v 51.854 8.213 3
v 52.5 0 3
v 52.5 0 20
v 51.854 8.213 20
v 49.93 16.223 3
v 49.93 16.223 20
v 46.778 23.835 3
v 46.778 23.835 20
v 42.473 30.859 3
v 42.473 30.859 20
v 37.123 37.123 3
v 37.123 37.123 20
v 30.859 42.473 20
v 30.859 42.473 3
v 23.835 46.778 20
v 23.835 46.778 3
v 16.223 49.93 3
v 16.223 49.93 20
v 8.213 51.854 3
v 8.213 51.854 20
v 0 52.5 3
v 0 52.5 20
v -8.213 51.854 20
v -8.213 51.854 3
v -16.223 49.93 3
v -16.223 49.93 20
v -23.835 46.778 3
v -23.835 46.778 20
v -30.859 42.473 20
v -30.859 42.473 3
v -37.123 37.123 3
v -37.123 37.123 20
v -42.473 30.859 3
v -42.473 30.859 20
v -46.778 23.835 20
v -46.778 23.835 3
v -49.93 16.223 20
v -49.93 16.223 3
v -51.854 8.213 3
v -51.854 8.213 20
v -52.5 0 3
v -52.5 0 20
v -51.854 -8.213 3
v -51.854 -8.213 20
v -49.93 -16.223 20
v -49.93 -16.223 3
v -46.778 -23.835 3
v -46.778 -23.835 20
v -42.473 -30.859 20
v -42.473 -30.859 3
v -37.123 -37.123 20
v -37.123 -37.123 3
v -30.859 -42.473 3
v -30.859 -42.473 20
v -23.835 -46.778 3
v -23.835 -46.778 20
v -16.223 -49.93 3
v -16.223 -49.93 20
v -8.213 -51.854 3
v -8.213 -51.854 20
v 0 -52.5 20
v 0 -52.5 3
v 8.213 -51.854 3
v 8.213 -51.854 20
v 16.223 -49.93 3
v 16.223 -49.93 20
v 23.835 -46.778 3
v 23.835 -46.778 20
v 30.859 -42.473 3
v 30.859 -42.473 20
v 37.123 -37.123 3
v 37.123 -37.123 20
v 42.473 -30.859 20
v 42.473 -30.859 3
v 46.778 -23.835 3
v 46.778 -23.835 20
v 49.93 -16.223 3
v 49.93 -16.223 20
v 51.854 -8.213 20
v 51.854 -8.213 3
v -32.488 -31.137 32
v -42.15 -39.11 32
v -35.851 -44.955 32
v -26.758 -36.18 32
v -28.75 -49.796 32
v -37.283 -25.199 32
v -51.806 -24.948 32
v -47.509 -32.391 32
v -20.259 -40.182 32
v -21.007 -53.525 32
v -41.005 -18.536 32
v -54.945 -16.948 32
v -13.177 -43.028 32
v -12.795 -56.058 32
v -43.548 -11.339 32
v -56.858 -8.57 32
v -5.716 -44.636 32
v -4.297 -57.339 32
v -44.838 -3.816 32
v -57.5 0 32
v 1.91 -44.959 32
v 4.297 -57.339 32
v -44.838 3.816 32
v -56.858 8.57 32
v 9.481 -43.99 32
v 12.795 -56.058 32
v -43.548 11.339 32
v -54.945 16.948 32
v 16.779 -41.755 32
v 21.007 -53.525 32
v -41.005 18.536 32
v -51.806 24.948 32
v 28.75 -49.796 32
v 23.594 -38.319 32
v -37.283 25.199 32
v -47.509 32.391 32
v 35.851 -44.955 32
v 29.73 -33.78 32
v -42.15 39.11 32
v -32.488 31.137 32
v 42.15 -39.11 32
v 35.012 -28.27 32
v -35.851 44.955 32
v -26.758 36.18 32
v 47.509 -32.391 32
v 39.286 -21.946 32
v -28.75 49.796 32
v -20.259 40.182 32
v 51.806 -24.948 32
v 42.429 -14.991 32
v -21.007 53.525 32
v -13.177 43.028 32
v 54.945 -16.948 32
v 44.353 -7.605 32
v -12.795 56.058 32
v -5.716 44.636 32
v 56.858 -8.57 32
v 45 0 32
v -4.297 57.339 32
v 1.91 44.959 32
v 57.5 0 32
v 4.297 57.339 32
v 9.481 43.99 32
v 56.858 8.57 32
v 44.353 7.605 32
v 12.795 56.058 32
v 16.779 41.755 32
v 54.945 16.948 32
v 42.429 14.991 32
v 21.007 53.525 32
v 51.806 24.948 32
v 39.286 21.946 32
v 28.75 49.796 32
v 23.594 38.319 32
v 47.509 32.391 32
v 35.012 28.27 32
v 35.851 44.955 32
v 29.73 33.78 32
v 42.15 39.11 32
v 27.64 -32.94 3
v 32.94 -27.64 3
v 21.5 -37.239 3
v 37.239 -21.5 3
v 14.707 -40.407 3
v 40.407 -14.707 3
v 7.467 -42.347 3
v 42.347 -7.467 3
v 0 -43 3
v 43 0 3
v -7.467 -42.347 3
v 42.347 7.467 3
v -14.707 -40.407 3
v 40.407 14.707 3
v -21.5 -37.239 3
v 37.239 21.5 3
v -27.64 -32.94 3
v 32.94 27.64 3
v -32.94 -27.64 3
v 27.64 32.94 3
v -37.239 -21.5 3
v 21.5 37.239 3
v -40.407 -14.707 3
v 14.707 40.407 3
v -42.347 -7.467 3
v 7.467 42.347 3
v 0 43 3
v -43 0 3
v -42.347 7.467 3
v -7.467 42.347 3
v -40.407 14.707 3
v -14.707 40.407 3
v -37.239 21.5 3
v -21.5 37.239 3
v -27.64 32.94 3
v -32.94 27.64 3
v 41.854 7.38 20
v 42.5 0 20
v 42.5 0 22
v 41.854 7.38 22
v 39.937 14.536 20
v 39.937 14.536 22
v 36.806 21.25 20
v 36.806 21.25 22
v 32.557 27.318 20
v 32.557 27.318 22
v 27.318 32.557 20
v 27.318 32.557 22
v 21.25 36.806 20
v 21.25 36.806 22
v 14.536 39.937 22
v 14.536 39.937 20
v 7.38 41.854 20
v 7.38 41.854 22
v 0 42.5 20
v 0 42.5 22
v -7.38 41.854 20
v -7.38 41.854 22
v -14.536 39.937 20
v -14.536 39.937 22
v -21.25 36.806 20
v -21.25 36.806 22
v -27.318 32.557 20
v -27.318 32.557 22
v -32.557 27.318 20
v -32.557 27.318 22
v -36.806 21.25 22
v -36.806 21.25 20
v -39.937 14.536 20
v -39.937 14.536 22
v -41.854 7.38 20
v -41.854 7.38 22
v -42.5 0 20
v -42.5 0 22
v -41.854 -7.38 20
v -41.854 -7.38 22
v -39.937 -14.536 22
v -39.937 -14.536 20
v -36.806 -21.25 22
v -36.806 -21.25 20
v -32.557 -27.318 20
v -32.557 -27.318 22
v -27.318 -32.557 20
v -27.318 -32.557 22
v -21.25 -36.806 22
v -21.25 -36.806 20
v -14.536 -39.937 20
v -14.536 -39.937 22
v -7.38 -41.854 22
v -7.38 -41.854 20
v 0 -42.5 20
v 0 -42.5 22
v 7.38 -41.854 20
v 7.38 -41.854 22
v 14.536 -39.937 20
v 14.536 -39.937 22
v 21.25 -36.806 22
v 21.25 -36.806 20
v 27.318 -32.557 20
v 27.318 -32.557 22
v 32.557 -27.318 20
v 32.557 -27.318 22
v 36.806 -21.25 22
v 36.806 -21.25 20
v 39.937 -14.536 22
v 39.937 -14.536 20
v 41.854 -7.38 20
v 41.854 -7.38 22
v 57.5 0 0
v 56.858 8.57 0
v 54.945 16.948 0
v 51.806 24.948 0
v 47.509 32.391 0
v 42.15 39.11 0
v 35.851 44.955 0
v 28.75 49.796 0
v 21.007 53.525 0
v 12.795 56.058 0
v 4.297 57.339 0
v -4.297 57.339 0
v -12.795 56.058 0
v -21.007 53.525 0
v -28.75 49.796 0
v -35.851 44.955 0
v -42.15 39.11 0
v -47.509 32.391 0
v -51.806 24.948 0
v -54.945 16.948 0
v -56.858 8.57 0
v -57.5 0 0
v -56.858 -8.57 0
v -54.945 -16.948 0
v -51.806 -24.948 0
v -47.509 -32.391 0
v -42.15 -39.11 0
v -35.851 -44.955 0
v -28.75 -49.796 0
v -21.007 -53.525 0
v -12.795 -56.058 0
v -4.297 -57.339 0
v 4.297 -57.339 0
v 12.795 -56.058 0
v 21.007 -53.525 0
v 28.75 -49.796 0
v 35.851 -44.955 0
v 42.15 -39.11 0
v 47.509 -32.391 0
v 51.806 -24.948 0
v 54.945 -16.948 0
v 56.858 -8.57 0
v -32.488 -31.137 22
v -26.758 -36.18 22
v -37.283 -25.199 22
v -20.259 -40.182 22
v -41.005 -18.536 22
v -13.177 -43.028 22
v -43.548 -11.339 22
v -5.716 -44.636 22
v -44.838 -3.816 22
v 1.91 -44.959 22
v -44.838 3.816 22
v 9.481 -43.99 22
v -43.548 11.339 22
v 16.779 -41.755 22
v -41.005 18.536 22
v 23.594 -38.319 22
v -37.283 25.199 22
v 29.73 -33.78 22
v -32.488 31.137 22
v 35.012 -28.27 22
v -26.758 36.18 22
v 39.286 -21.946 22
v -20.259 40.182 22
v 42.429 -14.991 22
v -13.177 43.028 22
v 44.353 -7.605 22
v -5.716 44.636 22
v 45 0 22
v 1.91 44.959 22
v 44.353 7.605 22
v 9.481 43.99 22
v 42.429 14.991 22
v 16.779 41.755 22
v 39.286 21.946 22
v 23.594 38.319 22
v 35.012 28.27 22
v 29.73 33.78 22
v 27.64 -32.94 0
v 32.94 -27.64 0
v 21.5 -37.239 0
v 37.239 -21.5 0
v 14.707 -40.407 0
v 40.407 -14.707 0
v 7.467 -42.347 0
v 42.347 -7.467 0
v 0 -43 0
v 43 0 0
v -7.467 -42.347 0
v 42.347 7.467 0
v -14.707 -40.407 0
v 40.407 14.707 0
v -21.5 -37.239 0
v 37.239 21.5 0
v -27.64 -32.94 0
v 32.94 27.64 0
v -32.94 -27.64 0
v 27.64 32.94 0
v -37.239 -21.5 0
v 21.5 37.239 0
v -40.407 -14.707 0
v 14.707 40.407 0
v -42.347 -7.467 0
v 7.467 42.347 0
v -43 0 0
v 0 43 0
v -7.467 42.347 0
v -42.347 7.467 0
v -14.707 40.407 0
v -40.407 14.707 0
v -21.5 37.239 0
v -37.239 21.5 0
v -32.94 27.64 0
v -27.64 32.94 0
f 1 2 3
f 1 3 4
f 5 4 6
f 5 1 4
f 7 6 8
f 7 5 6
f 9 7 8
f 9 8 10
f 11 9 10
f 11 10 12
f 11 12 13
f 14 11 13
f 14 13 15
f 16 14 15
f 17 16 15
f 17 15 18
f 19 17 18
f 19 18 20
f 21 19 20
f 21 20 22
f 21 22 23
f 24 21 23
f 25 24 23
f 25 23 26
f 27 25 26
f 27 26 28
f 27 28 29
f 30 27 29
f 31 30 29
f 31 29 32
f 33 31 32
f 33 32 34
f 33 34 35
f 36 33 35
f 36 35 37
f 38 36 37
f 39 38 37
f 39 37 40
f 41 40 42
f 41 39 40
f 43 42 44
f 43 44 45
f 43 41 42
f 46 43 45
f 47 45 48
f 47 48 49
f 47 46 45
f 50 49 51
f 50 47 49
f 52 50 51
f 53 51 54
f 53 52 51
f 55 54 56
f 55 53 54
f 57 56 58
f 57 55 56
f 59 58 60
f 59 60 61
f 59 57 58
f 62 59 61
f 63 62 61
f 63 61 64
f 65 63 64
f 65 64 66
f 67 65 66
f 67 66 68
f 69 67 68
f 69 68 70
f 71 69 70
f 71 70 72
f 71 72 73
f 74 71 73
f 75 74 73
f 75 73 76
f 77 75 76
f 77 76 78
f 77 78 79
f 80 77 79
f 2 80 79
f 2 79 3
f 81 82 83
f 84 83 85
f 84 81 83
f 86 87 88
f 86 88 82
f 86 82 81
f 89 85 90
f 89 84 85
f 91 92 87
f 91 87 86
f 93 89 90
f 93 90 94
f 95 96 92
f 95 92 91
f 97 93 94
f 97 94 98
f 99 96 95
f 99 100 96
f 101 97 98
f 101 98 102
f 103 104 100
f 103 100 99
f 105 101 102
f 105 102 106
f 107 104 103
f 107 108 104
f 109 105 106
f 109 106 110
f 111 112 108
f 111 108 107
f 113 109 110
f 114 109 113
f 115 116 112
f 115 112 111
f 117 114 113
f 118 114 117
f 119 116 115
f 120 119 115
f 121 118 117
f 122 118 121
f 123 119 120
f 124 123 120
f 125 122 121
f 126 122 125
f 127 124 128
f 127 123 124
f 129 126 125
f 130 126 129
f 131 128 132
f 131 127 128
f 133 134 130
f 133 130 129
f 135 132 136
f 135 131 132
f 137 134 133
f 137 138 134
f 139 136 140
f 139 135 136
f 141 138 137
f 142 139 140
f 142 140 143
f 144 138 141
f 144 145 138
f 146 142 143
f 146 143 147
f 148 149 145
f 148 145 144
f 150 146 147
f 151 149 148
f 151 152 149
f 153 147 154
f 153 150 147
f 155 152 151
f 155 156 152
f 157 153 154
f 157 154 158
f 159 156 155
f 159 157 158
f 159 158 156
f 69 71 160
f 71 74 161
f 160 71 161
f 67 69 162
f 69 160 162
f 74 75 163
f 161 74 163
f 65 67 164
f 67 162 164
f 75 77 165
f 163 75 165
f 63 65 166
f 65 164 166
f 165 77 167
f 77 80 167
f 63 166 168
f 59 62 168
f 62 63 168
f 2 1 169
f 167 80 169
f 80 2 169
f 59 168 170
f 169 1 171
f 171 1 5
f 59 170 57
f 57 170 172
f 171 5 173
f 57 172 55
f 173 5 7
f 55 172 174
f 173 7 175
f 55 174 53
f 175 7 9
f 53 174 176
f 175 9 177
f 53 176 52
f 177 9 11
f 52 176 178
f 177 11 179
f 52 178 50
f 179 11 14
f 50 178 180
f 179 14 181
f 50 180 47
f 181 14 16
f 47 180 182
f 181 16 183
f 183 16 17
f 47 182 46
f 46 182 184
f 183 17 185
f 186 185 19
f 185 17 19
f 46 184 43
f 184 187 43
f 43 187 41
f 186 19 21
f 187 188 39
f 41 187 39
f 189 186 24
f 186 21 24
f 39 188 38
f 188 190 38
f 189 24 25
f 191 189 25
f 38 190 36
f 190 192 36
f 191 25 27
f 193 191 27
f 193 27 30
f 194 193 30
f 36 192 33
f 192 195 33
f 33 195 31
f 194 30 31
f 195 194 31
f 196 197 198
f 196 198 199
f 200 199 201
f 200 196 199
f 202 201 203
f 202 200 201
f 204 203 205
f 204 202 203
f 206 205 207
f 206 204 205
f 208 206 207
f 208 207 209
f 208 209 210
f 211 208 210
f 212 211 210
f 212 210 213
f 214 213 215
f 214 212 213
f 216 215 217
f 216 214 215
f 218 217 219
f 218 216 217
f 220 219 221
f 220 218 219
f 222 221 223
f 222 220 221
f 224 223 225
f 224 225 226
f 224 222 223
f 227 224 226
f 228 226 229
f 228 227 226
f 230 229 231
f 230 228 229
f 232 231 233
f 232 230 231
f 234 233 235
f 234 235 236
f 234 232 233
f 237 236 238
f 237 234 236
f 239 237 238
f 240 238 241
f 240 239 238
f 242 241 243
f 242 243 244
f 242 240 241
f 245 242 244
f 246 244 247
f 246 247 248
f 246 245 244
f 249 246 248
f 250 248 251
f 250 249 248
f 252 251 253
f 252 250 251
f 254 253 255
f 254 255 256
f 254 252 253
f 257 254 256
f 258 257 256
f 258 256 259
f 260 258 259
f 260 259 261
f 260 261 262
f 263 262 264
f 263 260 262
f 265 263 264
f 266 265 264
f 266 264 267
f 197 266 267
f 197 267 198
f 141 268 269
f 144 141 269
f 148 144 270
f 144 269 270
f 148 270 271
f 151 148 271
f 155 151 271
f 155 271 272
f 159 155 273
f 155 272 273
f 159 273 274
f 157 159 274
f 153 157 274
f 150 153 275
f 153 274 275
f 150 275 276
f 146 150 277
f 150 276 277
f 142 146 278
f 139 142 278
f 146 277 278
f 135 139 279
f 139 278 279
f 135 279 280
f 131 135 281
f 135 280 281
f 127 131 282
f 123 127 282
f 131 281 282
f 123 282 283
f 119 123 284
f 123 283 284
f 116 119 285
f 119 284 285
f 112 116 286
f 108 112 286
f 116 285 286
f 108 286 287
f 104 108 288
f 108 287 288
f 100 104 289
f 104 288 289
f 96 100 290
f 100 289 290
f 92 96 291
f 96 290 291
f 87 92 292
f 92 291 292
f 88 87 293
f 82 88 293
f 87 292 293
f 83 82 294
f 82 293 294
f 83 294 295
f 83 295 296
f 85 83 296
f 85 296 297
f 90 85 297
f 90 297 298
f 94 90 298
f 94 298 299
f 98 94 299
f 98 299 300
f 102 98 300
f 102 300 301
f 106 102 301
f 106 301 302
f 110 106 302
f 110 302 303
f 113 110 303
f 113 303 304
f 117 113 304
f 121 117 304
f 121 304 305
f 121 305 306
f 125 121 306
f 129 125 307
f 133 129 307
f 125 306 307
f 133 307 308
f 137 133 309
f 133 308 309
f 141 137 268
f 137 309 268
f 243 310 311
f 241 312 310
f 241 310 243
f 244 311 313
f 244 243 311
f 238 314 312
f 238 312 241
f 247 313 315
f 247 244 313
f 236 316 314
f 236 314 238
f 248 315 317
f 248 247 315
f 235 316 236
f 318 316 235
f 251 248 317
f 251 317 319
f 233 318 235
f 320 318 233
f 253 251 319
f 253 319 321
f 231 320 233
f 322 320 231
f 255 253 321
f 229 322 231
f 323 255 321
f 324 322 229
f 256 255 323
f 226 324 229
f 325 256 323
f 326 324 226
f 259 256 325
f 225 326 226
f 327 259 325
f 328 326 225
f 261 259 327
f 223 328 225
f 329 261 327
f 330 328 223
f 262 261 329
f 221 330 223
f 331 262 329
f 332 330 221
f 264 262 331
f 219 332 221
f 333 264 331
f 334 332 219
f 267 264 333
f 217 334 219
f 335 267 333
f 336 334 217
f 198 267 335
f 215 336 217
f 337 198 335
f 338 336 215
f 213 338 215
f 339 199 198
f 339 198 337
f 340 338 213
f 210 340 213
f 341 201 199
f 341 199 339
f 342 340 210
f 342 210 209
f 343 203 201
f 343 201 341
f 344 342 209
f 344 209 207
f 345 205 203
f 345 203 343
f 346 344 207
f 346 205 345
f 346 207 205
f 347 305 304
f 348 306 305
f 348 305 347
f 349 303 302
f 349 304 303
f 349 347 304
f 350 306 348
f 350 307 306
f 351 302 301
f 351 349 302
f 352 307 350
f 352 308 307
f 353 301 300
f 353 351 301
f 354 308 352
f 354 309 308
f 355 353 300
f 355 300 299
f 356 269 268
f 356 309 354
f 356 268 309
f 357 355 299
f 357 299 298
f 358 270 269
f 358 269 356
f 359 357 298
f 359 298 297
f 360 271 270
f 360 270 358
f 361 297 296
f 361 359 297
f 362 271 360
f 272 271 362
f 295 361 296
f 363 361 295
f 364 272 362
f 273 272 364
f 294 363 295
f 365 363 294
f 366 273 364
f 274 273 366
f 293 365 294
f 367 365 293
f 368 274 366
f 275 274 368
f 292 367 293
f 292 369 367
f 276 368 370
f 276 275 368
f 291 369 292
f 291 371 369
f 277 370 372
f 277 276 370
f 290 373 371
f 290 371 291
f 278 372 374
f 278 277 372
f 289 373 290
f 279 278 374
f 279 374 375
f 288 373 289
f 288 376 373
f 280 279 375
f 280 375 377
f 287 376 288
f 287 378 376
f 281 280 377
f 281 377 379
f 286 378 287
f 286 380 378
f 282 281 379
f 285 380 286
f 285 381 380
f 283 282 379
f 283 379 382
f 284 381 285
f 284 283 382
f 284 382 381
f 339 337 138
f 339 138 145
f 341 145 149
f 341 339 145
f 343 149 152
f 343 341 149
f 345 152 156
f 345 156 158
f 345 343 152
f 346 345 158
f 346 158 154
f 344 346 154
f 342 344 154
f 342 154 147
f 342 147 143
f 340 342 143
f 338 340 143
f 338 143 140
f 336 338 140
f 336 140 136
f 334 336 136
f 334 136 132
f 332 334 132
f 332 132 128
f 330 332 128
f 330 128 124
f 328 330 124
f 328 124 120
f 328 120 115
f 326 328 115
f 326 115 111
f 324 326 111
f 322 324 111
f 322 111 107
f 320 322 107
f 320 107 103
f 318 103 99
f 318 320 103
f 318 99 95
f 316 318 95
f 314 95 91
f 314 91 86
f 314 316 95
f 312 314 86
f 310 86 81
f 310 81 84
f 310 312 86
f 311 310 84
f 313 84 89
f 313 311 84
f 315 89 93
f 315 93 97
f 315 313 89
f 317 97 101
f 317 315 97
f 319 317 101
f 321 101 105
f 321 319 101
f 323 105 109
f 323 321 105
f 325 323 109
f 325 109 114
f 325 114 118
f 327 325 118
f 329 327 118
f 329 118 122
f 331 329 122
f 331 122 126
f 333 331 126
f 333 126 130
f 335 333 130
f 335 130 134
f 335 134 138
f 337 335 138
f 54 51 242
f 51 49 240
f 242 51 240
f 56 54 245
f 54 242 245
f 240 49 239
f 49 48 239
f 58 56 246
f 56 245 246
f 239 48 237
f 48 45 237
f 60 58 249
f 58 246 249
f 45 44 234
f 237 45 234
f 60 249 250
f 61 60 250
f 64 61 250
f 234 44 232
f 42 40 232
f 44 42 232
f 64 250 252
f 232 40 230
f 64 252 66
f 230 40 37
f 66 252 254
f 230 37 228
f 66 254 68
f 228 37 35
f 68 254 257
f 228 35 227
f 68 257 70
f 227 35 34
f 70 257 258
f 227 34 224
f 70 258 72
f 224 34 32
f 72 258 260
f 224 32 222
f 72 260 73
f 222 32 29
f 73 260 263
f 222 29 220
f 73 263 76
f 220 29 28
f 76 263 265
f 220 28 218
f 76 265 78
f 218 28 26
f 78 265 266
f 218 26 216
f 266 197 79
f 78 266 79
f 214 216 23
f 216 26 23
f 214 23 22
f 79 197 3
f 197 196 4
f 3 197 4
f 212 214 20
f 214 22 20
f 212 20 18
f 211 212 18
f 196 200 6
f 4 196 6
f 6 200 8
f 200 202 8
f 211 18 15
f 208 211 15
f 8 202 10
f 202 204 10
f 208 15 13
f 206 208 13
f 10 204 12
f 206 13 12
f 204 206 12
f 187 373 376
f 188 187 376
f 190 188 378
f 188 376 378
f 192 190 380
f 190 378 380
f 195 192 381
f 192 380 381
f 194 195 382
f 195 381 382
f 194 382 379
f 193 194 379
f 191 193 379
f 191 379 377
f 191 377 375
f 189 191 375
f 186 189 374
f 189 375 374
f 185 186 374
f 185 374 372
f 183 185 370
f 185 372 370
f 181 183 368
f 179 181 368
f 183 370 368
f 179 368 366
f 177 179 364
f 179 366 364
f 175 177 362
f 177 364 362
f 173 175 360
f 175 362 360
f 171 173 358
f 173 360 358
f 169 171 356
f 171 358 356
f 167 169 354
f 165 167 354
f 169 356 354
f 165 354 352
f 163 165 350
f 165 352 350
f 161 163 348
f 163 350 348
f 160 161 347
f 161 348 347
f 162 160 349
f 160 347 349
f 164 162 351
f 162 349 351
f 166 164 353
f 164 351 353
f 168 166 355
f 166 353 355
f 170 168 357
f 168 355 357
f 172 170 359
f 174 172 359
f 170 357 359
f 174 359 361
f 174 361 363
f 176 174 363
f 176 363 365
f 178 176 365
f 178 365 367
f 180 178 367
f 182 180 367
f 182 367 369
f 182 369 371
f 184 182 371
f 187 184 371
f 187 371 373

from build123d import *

# Parameters (mm, degrees)
SKETCH1_R           = 57.5
SKETCH1_R_2         = 52.5
BOSS_EXTRUDE1_DEPTH = 32
SKETCH3_R           = 52.5
SKETCH3_R_2         = 45
SKETCH3_R_3         = 35
BOSS_EXTRUDE3_DEPTH = 12
SKETCH7_R           = 45
SKETCH7_R_2         = 42.5
BOSS_EXTRUDE4_DEPTH = 2
SKETCH10_R          = 52.5
SKETCH10_R_2        = 43
BOSS_EXTRUDE5_DEPTH = 3


with BuildPart() as part:
    # Sketch1 → Boss-Extrude1 (new body)
    with BuildSketch(Plane.XY):
        Circle(SKETCH1_R)
        Circle(SKETCH1_R_2, mode=Mode.SUBTRACT)
    extrude(amount=BOSS_EXTRUDE1_DEPTH)

    # Sketch3 → Boss-Extrude3 (add)
    # profile 1 of 2: a face of its own
    with BuildSketch(Plane.XY.offset(20)):
        Circle(SKETCH3_R)
        Circle(SKETCH3_R_2, mode=Mode.SUBTRACT)
    # profile 2 of 2: a face of its own
    with BuildSketch(Plane.XY.offset(20)):
        Circle(SKETCH3_R_3)
    extrude(amount=BOSS_EXTRUDE3_DEPTH)


with BuildPart() as boss_extrude3_kept_piece:
    # of the separate pieces the step leaves, the one the design keeps (boss_extrude3_pieces_kept)
    add(part.part.solids().sort_by_distance((57.5, 0, 0))[0])

    # Sketch7 → Boss-Extrude4 (add)
    with BuildSketch(Plane.XY.offset(20)):
        Circle(SKETCH7_R)
        Circle(SKETCH7_R_2, mode=Mode.SUBTRACT)
    extrude(amount=BOSS_EXTRUDE4_DEPTH)

    # Sketch10 → Boss-Extrude5 (add)
    with BuildSketch(Plane(origin=(0, 0, 0), x_dir=(-1, 0, 0), z_dir=(0, 0, -1))):
        Circle(SKETCH10_R)
        Circle(SKETCH10_R_2, mode=Mode.SUBTRACT)
    extrude(amount=-BOSS_EXTRUDE5_DEPTH)


solid = boss_extrude3_kept_piece.part
